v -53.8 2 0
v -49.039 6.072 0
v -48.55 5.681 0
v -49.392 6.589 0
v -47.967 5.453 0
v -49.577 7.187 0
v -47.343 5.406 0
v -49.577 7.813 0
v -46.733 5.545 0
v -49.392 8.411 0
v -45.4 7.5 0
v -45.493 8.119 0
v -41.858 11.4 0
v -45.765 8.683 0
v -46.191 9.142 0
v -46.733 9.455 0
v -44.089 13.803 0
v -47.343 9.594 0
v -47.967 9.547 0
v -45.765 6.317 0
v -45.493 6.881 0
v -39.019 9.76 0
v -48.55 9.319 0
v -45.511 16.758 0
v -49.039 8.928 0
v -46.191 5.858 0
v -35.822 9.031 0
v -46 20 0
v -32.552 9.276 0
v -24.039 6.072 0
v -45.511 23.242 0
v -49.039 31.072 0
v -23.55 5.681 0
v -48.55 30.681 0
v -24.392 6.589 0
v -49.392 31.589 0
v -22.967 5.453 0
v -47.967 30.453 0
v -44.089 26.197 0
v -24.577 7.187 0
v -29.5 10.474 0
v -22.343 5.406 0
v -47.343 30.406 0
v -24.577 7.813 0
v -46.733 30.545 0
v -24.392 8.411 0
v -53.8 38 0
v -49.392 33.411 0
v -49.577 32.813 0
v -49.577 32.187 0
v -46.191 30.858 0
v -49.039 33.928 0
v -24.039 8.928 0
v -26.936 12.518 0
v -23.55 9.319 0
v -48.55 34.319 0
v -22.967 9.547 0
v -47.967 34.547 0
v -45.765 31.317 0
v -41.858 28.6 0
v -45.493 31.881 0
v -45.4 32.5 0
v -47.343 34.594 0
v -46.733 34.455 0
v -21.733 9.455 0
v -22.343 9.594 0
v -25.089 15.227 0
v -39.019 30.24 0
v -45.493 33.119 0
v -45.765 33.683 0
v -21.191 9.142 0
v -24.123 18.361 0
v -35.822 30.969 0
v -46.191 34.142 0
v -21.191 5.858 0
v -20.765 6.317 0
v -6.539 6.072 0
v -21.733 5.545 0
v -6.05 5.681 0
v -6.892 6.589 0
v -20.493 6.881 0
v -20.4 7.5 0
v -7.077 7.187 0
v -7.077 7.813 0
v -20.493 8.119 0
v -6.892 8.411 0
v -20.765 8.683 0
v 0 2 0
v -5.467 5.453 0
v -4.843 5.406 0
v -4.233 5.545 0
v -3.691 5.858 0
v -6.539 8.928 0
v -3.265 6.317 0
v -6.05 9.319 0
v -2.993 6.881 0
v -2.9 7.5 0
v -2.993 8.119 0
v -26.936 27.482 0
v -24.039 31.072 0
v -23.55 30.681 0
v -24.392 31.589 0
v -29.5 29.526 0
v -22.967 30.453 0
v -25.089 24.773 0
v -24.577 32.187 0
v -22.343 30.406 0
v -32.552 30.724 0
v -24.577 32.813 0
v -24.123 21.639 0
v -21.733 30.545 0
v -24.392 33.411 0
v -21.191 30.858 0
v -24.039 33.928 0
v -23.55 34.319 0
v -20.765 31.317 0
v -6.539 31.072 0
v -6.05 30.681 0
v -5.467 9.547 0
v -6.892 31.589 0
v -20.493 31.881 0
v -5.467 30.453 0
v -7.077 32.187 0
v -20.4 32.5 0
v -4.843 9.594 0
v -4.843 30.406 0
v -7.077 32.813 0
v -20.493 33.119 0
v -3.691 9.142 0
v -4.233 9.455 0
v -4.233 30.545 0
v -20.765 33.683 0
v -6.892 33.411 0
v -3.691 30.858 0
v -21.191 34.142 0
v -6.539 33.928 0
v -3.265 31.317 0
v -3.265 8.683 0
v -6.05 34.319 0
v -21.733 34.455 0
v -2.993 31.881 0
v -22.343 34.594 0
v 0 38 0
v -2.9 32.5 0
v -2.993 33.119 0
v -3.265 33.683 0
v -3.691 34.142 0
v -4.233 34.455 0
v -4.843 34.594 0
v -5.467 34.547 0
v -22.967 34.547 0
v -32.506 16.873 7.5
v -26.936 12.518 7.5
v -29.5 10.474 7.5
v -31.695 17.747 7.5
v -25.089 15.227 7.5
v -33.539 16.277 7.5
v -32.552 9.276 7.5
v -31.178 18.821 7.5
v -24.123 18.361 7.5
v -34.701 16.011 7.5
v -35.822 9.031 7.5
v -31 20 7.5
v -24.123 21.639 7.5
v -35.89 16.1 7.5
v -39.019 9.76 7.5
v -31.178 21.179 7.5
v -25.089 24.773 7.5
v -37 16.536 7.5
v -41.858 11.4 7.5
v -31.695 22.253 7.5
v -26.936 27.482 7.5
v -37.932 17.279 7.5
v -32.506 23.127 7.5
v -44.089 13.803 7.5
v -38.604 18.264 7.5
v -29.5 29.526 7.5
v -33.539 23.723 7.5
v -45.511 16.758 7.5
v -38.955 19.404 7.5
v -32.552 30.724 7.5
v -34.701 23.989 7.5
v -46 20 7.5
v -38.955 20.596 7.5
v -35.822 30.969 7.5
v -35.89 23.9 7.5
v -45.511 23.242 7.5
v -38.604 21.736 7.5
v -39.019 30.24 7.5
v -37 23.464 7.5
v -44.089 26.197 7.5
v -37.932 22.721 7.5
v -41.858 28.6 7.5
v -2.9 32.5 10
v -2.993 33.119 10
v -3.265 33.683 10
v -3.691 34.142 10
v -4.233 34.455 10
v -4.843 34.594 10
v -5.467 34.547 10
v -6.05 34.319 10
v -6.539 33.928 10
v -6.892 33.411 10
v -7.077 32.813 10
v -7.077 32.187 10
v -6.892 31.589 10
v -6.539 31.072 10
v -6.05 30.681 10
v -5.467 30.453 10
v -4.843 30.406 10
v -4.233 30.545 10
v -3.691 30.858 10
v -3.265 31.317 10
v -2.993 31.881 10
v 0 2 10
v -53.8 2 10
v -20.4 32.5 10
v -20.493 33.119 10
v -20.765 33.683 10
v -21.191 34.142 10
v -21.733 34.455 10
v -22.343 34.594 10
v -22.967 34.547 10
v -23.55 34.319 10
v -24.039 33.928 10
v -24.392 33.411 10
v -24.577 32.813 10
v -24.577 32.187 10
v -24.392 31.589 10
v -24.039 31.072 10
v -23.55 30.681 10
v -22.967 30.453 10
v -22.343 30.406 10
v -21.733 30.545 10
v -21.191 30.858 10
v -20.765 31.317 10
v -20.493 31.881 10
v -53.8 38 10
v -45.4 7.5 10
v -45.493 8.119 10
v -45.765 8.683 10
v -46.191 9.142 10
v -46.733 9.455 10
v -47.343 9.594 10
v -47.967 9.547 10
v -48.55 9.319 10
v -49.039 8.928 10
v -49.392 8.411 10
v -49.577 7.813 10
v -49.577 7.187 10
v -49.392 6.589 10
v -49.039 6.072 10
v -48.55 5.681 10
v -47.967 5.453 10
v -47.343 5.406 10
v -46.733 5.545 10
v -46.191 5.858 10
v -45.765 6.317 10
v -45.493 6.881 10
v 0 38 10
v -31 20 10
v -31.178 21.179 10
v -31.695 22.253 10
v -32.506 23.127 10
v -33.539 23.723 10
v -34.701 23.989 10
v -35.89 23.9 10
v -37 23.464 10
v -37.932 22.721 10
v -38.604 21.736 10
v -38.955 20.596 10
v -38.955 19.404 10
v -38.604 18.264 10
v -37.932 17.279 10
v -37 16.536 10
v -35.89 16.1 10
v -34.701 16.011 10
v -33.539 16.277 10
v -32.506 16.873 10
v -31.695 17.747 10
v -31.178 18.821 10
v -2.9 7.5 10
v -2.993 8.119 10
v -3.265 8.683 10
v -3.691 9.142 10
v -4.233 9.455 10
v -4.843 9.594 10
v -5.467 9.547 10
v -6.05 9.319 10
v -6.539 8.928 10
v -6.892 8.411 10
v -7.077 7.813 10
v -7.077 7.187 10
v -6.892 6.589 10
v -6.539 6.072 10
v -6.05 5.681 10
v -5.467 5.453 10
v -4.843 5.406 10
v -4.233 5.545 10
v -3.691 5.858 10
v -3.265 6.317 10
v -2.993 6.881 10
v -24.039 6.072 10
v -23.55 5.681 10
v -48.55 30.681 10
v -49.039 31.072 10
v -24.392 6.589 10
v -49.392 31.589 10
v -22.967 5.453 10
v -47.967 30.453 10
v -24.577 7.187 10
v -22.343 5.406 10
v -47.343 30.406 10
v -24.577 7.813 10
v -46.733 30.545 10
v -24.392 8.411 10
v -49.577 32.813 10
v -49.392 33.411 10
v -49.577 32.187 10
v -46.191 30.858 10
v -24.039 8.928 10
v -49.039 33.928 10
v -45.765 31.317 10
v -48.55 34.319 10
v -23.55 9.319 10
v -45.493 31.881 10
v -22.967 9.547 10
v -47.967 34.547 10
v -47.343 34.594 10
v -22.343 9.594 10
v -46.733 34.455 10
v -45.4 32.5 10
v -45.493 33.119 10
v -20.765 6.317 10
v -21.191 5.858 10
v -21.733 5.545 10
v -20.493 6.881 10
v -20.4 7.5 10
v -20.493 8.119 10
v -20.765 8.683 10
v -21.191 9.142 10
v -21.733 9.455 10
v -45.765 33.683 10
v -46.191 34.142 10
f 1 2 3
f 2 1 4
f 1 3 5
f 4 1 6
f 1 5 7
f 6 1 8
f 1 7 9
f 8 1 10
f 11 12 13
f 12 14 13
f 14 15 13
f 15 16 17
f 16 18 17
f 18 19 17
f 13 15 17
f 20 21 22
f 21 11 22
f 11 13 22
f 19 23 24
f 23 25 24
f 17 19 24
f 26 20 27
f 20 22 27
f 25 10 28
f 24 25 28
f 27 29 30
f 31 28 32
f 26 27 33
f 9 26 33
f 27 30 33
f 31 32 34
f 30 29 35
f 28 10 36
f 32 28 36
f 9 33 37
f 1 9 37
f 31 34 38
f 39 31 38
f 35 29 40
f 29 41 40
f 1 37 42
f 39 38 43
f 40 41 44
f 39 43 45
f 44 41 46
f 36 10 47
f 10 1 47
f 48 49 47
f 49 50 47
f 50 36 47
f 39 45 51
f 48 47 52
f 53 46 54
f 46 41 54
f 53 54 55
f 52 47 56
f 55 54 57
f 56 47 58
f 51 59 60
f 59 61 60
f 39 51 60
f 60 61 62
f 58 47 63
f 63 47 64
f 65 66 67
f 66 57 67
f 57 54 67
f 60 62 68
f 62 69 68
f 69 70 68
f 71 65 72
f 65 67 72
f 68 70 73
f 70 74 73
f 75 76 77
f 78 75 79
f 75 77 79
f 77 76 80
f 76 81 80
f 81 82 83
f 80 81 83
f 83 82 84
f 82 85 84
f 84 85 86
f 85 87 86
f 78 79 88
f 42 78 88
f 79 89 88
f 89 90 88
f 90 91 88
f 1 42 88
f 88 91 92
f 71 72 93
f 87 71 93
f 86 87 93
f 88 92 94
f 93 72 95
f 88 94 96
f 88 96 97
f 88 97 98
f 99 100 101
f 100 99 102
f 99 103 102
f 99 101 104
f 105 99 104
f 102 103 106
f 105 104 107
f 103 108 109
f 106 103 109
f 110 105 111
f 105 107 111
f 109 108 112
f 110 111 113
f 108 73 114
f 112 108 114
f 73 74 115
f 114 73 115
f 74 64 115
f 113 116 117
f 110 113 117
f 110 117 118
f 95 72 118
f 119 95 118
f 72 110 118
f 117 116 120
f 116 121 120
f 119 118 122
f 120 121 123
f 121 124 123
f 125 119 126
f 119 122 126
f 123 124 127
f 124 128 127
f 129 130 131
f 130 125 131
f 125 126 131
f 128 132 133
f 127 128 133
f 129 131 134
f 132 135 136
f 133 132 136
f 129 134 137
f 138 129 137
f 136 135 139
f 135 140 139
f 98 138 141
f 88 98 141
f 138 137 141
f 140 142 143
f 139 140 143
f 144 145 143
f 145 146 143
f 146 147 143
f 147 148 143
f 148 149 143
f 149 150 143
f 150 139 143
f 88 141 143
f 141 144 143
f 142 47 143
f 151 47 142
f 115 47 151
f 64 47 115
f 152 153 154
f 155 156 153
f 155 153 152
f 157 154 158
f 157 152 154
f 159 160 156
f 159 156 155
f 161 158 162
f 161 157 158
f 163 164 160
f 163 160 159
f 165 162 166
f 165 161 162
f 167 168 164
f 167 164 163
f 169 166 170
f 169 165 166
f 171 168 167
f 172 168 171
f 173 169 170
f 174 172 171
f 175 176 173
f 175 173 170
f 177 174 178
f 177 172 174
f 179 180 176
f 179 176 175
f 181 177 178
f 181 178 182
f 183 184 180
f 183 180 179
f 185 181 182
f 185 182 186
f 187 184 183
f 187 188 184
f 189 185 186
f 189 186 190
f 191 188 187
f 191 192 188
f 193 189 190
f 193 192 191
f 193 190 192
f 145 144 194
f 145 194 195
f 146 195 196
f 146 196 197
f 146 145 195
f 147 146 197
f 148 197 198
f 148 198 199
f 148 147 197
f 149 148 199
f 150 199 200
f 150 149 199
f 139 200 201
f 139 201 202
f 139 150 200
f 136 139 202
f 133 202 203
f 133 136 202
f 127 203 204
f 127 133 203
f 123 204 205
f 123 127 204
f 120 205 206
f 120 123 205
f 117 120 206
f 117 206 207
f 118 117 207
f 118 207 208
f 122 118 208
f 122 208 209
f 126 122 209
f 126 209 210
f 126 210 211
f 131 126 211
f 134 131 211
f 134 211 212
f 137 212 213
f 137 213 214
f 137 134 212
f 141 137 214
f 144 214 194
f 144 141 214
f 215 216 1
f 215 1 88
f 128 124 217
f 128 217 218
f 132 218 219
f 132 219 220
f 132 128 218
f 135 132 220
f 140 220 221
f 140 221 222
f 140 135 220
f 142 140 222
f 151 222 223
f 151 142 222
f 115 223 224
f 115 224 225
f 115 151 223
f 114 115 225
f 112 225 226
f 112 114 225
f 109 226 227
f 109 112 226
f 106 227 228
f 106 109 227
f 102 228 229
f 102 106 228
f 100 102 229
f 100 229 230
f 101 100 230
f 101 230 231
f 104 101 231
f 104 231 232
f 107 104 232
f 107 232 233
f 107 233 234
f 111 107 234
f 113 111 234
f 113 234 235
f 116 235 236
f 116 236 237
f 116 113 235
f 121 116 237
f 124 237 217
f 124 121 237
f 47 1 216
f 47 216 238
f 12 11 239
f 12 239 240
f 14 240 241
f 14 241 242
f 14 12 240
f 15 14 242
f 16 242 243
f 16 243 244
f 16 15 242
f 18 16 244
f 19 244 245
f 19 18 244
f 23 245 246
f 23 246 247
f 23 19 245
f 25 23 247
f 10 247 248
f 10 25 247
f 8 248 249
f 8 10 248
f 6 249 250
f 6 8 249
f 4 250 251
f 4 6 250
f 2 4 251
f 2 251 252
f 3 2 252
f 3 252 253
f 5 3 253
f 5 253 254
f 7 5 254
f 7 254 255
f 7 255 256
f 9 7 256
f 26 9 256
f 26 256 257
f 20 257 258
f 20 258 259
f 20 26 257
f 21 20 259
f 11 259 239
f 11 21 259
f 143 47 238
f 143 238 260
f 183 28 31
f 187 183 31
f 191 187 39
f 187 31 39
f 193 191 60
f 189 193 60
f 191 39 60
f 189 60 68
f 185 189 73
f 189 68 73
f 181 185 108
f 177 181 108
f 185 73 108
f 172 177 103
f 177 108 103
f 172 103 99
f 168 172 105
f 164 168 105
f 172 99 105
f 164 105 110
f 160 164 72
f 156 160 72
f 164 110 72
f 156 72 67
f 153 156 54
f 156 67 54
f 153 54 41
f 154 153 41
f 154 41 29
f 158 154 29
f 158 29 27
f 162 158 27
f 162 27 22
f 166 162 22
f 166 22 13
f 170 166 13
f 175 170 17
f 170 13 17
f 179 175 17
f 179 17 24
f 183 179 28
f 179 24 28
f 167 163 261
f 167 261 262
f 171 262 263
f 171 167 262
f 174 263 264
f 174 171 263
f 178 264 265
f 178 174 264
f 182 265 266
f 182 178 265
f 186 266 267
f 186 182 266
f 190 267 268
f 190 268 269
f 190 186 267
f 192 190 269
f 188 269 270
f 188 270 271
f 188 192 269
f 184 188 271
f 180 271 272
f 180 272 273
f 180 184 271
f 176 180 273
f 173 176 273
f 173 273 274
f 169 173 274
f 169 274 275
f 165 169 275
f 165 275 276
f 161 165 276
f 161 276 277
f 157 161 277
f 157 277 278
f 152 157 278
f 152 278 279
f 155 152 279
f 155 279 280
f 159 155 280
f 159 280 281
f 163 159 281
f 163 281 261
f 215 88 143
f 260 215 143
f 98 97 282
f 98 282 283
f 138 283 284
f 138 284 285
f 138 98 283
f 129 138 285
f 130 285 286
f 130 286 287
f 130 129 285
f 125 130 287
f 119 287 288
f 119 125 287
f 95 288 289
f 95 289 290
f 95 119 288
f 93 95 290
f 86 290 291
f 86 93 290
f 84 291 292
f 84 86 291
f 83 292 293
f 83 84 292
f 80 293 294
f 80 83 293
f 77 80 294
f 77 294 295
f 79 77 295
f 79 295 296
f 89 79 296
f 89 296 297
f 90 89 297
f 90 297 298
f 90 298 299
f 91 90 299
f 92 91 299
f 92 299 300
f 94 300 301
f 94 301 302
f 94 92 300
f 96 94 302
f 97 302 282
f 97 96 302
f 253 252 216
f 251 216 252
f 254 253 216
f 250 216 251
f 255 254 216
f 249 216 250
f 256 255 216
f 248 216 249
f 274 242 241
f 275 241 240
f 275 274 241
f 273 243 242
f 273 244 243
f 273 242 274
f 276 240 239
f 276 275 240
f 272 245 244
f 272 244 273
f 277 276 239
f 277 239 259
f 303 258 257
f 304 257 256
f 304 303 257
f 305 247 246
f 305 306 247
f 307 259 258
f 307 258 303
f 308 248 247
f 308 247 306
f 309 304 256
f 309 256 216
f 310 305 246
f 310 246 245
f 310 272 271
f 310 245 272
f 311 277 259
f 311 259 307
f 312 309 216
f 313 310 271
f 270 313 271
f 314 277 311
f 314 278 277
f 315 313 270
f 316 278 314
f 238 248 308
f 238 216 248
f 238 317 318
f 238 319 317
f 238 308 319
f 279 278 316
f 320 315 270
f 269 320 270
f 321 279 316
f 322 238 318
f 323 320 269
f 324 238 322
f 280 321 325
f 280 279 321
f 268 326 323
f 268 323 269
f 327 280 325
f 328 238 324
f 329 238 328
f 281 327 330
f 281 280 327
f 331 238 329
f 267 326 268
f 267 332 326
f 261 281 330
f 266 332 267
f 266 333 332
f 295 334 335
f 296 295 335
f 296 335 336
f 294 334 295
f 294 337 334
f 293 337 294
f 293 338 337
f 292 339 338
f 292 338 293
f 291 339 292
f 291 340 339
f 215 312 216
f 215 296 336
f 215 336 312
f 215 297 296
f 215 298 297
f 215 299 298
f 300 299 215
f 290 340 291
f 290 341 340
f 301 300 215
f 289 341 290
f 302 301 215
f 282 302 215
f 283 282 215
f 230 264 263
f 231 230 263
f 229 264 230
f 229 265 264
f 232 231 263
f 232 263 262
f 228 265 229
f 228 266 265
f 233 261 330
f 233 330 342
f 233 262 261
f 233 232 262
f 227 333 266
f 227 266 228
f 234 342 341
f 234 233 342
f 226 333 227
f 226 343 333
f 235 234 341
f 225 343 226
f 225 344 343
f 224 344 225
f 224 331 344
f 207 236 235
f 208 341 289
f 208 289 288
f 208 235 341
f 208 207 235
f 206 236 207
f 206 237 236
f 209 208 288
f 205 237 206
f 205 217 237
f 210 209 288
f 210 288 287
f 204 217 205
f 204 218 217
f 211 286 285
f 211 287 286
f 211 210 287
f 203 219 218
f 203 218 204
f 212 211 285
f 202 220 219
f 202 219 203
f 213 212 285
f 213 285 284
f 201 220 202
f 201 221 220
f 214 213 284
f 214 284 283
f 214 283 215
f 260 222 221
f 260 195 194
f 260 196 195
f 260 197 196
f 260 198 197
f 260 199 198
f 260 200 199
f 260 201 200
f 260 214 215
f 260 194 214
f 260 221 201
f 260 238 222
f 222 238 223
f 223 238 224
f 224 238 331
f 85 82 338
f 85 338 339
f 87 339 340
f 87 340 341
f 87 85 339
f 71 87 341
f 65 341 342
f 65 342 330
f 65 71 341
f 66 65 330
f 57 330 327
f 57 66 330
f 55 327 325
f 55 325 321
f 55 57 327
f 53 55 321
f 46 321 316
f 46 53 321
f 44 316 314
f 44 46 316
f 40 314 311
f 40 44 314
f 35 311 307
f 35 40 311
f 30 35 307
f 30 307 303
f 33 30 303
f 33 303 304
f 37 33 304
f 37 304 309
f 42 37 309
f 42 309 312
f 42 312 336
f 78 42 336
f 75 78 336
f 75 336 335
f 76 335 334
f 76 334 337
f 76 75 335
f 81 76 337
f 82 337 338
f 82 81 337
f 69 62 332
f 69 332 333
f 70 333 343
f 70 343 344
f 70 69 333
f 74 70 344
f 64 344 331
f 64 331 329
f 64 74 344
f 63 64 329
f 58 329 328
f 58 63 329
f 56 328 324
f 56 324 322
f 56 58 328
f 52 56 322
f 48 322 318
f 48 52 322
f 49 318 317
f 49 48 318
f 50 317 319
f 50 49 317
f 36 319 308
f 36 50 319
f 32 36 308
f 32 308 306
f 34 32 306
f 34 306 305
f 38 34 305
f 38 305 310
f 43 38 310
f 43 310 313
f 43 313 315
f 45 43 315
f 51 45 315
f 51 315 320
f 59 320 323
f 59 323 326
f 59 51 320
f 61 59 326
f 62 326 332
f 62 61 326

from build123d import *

# Parameters (mm, degrees)
SKETCH1_W           = 53.8
SKETCH1_H           = 40
SKETCH1_R           = 2.1
SKETCH1_R_2         = 4
BOSS_EXTRUDE1_DEPTH = 10
SKETCH2_R           = 11
CUT_EXTRUDE1_DEPTH  = 7.5
SKETCH3_W           = 53.8
SKETCH3_H           = 10
CUT_EXTRUDE2_DEPTH  = 2
SKETCH4_W           = 53.8
SKETCH4_H           = 10
CUT_EXTRUDE3_DEPTH  = 2


with BuildPart() as part:
    # Sketch1 → Boss-Extrude1 (new body)
    with BuildSketch(Plane.XY):
        with Locations((-26.9, 20)):
            Rectangle(SKETCH1_W, SKETCH1_H)
        with Locations((-22.5, 32.5)):
            Circle(SKETCH1_R, mode=Mode.SUBTRACT)
        with Locations((-47.5, 7.5)):
            Circle(SKETCH1_R, mode=Mode.SUBTRACT)
        with Locations((-47.5, 32.5)):
            Circle(SKETCH1_R, mode=Mode.SUBTRACT)
        with Locations((-22.5, 7.5)):
            Circle(SKETCH1_R, mode=Mode.SUBTRACT)
        with Locations((-5, 32.5)):
            Circle(SKETCH1_R, mode=Mode.SUBTRACT)
        with Locations((-5, 7.5)):
            Circle(SKETCH1_R, mode=Mode.SUBTRACT)
        with Locations((-35, 20)):
            Circle(SKETCH1_R_2, mode=Mode.SUBTRACT)
    extrude(amount=BOSS_EXTRUDE1_DEPTH)

    # Sketch2 → Cut-Extrude1 (cut)
    with BuildSketch(Plane(origin=(0, 0, 0), x_dir=(-1, 0, 0), z_dir=(0, 0, -1))):
        with Locations((35, 20)):
            Circle(SKETCH2_R)
    extrude(amount=-CUT_EXTRUDE1_DEPTH, mode=Mode.SUBTRACT)

    # Sketch3 → Cut-Extrude2 (cut)
    with BuildSketch(Plane.XZ):
        with Locations((-26.9, 5)):
            Rectangle(SKETCH3_W, SKETCH3_H)
    extrude(amount=-CUT_EXTRUDE2_DEPTH, mode=Mode.SUBTRACT)

    # Sketch4 → Cut-Extrude3 (cut)
    with BuildSketch(Plane(origin=(0, 40, 0), x_dir=(1, 0, 0), z_dir=(0, 1, 0))):
        with Locations((-26.9, -5)):
            Rectangle(SKETCH4_W, SKETCH4_H)
    extrude(amount=-CUT_EXTRUDE3_DEPTH, mode=Mode.SUBTRACT)


solid = part.part
